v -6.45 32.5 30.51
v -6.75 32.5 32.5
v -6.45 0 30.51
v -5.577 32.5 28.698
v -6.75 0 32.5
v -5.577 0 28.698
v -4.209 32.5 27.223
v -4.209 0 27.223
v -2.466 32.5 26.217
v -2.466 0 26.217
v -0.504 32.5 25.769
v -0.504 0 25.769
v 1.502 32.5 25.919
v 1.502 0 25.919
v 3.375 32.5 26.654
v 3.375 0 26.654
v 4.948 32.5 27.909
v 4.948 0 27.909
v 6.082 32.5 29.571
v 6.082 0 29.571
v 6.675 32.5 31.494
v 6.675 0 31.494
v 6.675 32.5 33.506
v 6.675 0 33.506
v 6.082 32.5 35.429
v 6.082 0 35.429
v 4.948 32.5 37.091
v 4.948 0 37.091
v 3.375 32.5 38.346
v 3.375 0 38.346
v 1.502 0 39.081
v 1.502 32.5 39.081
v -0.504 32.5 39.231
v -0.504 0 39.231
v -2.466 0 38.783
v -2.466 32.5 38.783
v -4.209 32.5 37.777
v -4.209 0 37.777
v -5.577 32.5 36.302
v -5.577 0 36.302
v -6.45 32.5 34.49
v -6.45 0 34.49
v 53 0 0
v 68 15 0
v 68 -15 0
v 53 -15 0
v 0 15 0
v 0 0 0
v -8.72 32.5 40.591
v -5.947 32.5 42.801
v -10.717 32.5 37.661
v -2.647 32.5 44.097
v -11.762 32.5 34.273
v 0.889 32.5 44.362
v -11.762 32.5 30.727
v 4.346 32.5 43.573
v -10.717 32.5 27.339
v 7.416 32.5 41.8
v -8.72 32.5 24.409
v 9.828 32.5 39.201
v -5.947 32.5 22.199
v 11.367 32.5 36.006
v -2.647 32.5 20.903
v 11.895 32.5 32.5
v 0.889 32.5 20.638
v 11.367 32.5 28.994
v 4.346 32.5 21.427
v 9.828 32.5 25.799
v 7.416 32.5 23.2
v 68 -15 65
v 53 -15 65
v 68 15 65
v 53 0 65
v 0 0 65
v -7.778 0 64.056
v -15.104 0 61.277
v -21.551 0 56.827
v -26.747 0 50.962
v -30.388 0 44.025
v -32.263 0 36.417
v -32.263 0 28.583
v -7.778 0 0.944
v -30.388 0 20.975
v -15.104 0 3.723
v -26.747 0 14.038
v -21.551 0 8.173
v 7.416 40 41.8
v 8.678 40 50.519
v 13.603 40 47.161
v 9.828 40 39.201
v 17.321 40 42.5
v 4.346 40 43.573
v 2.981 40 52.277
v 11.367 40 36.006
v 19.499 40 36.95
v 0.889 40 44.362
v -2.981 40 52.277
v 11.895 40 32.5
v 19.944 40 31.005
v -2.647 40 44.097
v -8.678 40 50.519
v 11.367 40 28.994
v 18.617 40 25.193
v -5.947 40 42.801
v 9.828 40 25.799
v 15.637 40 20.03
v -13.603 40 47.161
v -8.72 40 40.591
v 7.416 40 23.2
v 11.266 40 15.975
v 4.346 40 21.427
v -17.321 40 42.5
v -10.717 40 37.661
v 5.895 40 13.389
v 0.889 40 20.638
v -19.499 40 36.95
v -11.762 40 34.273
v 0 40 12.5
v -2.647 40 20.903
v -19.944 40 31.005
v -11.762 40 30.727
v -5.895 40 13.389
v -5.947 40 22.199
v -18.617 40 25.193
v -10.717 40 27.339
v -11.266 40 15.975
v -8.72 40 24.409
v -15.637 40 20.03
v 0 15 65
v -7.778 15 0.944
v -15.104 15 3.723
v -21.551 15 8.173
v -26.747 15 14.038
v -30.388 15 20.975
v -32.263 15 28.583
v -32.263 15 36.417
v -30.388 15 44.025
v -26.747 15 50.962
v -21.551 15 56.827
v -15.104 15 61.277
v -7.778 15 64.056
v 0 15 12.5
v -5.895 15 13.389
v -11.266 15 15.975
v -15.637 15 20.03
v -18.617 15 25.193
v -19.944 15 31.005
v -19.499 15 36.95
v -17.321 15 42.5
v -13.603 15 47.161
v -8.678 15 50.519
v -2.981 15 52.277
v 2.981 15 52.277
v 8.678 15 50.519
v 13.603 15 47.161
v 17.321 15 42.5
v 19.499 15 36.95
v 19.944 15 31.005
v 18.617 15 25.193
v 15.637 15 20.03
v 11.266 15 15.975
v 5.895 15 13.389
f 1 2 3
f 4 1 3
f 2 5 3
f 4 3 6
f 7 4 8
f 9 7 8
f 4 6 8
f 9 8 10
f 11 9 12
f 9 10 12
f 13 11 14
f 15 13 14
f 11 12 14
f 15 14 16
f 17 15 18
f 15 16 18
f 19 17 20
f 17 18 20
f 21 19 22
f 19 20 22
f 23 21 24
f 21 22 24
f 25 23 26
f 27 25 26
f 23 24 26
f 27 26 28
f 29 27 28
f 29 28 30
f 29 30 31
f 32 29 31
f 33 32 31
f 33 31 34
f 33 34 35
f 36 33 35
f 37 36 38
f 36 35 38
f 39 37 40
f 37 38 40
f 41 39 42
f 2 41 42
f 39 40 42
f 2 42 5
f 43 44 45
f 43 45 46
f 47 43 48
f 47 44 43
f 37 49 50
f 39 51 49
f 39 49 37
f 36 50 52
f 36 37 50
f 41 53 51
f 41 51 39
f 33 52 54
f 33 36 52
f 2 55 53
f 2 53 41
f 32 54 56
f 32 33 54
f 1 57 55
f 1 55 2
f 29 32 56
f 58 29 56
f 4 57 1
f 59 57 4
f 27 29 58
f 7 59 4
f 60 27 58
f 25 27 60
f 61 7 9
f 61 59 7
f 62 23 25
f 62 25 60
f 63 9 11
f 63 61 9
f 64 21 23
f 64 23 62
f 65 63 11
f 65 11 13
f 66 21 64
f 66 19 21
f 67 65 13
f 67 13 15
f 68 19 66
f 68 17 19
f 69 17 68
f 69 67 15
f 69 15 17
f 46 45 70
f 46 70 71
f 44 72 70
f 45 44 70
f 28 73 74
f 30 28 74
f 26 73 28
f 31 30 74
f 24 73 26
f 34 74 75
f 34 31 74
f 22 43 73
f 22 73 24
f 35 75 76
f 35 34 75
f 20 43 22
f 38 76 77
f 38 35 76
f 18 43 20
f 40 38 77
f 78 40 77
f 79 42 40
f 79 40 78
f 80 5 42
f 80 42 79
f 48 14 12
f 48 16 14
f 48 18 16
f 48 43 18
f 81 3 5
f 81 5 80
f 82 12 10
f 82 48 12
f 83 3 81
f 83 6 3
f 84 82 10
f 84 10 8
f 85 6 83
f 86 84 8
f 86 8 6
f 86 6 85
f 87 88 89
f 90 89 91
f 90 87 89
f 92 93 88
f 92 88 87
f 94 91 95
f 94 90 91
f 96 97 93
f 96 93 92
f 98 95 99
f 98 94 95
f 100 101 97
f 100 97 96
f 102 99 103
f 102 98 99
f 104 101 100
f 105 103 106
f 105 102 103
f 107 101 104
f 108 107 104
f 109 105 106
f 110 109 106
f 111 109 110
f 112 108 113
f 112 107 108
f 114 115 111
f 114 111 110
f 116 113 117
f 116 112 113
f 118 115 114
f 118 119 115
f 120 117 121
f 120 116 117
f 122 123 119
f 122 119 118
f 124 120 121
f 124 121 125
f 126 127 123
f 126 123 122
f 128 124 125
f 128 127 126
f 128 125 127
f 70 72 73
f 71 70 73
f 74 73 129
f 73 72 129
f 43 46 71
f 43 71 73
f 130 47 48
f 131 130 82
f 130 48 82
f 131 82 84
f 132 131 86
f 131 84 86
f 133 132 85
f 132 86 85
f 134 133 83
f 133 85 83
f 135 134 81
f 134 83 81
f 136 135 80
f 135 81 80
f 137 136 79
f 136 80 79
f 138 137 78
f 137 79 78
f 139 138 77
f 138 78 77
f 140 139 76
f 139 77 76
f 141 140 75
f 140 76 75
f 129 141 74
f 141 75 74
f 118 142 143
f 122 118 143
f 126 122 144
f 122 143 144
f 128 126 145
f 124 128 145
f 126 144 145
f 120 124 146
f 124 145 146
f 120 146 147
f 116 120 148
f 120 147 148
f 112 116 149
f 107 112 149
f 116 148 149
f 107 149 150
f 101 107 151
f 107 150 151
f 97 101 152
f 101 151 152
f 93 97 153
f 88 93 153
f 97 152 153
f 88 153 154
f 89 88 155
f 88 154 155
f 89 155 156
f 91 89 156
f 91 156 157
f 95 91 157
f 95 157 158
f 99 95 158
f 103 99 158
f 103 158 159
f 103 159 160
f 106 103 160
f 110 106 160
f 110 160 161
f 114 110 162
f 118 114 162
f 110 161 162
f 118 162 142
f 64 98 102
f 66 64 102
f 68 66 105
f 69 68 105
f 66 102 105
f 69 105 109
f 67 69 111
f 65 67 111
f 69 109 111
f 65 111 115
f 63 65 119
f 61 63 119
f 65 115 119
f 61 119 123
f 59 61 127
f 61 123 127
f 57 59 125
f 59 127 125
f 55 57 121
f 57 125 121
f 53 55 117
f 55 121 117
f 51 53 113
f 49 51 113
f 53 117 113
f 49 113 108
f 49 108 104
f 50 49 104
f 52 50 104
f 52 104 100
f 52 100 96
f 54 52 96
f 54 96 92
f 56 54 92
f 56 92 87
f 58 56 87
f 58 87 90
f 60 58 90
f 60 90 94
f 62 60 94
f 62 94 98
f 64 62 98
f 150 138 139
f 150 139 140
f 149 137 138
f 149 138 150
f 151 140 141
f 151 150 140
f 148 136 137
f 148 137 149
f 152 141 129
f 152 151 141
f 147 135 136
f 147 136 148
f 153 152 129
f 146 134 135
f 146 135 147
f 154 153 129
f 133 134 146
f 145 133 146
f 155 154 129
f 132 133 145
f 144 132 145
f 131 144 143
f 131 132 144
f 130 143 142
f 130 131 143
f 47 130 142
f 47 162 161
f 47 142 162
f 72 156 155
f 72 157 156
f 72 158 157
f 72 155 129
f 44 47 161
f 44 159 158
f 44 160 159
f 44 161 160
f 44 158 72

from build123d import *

# Parameters (mm, degrees)
BOSS_EXTRUDE1_DEPTH                                 = 65
BOSS_EXTRUDE2_START                                 = -15
SKETCH2_R                                           = 32.5
BOSS_EXTRUDE2_DEPTH                                 = 15
SKETCH3_R                                           = 20
BOSS_EXTRUDE4_DEPTH                                 = 25
CBORE_FOR_1_BINDING_HEAD_MACHINE_SCREW1_D           = 13.499999924
CBORE_FOR_1_BINDING_HEAD_MACHINE_SCREW1_CBORE_D     = 23.789999918
CBORE_FOR_1_BINDING_HEAD_MACHINE_SCREW1_CBORE_DEPTH = 7.499999986


with BuildPart() as part:
    # Sketch1 → Boss-Extrude1 (new body)
    with BuildSketch(Plane.XY):
        Polygon((0, 0), (0, 15), (68, 15), (68, -15), (53, -15), (53, 0), align=None)
    extrude(amount=BOSS_EXTRUDE1_DEPTH)

    # Sketch2 → Boss-Extrude2 (add)
    with BuildSketch(Plane(origin=(0, 15, 0), x_dir=(1, 0, 0), z_dir=(0, 1, 0)).offset(BOSS_EXTRUDE2_START)):
        with Locations((0, -32.5)):
            Circle(SKETCH2_R)
    extrude(amount=BOSS_EXTRUDE2_DEPTH)

    # Sketch3 → Boss-Extrude4 (add)
    with BuildSketch(Plane(origin=(0, 15, 0), x_dir=(1, 0, 0), z_dir=(0, 1, 0))):
        with Locations(Location((0, -32.5, 0), (0, 0, 90))):
            Circle(SKETCH3_R)
    extrude(amount=BOSS_EXTRUDE4_DEPTH)

    # CBORE for #1 Binding Head Machine Screw1 (through all)
    with Locations(Plane(origin=(0, 40, 0), x_dir=(1, 0, 0), z_dir=(0, 1, 0))):
        with Locations((0, -32.5)):
            CounterBoreHole(CBORE_FOR_1_BINDING_HEAD_MACHINE_SCREW1_D / 2, CBORE_FOR_1_BINDING_HEAD_MACHINE_SCREW1_CBORE_D / 2, CBORE_FOR_1_BINDING_HEAD_MACHINE_SCREW1_CBORE_DEPTH)


solid = part.part
